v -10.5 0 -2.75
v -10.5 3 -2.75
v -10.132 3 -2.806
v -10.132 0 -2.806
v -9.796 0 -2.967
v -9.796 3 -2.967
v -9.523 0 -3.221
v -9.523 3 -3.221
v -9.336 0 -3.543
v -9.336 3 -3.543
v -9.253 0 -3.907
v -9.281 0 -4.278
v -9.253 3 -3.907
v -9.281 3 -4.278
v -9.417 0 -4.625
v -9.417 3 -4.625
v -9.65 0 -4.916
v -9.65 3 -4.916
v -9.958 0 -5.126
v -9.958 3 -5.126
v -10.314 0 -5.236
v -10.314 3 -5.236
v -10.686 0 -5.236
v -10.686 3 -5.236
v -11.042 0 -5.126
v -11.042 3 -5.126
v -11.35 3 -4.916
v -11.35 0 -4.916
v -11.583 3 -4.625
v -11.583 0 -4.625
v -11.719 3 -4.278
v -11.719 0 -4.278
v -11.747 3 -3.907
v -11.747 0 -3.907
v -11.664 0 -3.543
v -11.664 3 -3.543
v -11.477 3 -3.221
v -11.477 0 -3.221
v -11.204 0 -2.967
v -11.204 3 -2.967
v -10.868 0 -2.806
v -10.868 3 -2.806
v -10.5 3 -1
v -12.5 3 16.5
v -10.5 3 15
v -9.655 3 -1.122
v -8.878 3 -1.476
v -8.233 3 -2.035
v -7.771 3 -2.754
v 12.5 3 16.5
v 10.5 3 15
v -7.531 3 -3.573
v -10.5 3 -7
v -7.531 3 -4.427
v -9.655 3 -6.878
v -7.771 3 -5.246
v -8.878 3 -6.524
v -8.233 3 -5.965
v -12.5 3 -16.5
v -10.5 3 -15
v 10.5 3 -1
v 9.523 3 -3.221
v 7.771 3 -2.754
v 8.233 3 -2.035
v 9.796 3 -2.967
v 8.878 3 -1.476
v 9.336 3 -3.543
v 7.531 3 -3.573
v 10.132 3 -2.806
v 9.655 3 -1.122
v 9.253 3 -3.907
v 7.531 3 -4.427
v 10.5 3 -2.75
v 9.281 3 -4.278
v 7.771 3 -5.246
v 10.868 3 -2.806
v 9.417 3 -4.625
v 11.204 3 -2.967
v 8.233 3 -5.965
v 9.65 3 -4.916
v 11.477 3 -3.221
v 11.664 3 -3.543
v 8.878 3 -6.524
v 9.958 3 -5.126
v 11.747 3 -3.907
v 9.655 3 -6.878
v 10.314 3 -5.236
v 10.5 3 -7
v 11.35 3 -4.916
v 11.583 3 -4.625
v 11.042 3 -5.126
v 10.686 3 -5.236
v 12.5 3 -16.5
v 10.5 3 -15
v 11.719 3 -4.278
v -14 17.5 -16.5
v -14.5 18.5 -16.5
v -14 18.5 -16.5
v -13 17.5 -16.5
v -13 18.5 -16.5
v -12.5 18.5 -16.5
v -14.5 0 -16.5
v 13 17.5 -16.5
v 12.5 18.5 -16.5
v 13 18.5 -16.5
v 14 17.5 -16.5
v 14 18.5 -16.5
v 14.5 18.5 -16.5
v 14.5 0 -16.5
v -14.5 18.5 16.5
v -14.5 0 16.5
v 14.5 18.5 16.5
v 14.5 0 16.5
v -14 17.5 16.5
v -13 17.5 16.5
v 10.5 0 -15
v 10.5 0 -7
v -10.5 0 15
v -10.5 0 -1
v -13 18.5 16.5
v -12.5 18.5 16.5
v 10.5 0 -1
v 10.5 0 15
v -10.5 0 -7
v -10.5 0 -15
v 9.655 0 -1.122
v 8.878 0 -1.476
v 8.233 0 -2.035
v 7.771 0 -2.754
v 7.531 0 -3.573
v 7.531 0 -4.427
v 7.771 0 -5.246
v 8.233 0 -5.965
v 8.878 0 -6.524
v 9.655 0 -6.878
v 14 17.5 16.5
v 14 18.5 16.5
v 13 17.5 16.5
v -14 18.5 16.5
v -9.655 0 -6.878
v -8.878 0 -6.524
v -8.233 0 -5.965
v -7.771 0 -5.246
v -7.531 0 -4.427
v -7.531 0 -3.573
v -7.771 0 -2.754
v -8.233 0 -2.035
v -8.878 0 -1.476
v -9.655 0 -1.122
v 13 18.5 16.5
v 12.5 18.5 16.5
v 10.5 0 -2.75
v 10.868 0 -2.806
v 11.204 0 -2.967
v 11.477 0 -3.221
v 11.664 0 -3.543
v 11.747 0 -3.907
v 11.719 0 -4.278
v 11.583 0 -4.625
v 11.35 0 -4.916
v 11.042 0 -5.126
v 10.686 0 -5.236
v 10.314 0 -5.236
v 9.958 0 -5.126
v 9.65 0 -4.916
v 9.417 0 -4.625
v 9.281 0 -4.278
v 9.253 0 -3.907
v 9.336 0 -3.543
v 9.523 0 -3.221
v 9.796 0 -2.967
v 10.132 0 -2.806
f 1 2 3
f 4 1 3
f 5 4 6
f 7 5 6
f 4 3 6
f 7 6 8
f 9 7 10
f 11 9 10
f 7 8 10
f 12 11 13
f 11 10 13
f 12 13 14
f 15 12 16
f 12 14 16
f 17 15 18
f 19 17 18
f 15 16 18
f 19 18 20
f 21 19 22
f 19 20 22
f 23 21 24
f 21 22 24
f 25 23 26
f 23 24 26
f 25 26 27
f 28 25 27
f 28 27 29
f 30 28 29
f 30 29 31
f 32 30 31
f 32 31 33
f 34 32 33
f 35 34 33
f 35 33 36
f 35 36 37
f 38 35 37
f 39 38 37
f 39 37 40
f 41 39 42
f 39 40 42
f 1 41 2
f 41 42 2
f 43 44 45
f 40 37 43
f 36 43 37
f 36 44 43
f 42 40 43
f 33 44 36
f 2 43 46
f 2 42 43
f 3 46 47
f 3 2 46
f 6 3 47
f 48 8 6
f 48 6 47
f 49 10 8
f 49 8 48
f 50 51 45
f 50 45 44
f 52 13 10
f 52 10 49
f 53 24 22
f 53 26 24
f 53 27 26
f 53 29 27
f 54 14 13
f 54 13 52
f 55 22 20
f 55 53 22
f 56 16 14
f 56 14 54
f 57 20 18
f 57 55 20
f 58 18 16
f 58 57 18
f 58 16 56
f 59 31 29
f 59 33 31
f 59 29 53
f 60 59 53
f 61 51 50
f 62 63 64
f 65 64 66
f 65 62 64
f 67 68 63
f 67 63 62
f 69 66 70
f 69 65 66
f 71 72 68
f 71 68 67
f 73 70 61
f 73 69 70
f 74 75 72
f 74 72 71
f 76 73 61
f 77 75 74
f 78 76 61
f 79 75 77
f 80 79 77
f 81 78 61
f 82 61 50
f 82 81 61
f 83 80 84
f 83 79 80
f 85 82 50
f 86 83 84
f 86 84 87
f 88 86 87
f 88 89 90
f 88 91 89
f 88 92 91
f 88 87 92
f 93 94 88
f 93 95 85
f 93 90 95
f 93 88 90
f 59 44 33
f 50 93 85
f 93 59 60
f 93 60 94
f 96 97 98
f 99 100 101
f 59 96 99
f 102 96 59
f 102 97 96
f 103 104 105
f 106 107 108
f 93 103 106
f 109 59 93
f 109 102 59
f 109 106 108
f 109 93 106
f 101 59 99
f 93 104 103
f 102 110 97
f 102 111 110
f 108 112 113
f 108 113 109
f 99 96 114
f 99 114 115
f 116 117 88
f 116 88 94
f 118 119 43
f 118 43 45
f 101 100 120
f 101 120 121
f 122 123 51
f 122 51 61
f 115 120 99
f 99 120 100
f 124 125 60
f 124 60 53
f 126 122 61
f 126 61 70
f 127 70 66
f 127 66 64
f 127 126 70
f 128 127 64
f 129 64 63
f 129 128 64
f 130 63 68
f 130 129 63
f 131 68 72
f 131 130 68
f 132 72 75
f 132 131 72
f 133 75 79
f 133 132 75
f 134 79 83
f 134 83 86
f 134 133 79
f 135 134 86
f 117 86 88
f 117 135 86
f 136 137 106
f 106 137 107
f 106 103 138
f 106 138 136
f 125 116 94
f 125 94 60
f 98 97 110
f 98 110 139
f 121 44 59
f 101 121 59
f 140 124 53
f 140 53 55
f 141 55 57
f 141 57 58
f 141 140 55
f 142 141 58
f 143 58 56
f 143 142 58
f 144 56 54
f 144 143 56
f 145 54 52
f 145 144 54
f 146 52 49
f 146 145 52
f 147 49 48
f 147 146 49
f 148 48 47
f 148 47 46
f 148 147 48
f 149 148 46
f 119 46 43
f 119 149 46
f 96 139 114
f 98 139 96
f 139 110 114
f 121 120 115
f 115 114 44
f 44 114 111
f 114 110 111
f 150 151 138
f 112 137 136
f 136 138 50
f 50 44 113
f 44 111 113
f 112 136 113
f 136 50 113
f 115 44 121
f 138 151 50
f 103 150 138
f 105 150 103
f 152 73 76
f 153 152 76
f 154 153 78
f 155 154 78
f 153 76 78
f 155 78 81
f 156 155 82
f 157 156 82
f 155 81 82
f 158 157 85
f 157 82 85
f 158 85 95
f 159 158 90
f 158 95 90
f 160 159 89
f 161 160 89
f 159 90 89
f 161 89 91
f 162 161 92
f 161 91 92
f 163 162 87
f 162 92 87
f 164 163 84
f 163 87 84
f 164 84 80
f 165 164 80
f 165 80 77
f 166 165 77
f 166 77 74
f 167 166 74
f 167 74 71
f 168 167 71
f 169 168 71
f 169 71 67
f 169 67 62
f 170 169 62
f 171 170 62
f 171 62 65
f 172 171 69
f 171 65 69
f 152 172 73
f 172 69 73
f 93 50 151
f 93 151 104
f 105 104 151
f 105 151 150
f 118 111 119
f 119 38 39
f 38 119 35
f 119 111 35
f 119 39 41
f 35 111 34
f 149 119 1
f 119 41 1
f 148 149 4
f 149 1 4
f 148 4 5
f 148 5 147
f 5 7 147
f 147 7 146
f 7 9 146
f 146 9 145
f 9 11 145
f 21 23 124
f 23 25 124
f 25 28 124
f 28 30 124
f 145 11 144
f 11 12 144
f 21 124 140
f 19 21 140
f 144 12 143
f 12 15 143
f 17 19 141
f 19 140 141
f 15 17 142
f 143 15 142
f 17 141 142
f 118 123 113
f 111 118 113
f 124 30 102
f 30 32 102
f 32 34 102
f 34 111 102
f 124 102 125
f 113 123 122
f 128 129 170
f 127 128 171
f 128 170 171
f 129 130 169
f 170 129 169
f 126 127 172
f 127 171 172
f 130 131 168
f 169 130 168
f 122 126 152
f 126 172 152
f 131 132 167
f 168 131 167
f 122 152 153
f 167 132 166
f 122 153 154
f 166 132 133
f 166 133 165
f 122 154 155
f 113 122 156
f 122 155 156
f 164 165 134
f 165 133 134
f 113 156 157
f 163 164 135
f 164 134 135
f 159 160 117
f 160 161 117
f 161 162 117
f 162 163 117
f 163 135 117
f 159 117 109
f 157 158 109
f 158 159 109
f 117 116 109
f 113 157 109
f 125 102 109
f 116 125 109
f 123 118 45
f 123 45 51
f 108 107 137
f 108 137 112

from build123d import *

# Parameters (mm, degrees)
SKETCH1_W           = 24
SKETCH1_H           = 33
BOSS_EXTRUDE2_DEPTH = 3
SKETCH2_R           = 1.25
CUT_EXTRUDE2_DEPTH  = 3
SKETCH4_W           = 2.5
SKETCH4_H           = 33
BOSS_EXTRUDE3_DEPTH = 3
SKETCH5_W           = 2
SKETCH5_H           = 33
BOSS_EXTRUDE4_DEPTH = 15.5
SKETCH6_W           = 1
SKETCH6_H           = 33
CUT_EXTRUDE3_DEPTH  = 1


with BuildPart() as part:
    # Sketch1 → Boss-Extrude2 (new body)
    with BuildSketch(Plane(origin=(0, 0, 0), x_dir=(1, 0, 0), z_dir=(0, 1, 0))):
        Rectangle(SKETCH1_W, SKETCH1_H)
        with BuildLine():
            Line((10.5, 7), (10.5, 15))
            Line((10.5, 15), (-10.5, 15))
            Line((-10.5, 15), (-10.5, 7))
            ThreePointArc((-10.5, 7), (-7.5, 4), (-10.5, 1))
            Line((-10.5, 1), (-10.5, -15))
            Line((-10.5, -15), (10.5, -15))
            Line((10.5, -15), (10.5, 1))
            ThreePointArc((10.5, 1), (7.5, 4), (10.5, 7))
        make_face(mode=Mode.SUBTRACT)
    extrude(amount=BOSS_EXTRUDE2_DEPTH)

    # Sketch2 → Cut-Extrude2 (cut)
    with BuildSketch(Plane(origin=(0, 3, 0), x_dir=(1, 0, 0), z_dir=(0, 1, 0))):
        with Locations(Location((-10.5, 4, 0), (0, 0, 270))):
            Circle(SKETCH2_R)
        with Locations(Location((10.5, 4, 0), (0, 0, 270))):
            Circle(SKETCH2_R)
    extrude(amount=-CUT_EXTRUDE2_DEPTH, mode=Mode.SUBTRACT)

    # Sketch4 → Boss-Extrude3 (add)
    with BuildSketch(Plane(origin=(0, 3, 0), x_dir=(1, 0, 0), z_dir=(0, 1, 0))):
        with Locations((-13.25, 0)):
            Rectangle(SKETCH4_W, SKETCH4_H)
        with Locations((13.25, 0)):
            Rectangle(SKETCH4_W, SKETCH4_H)
    extrude(amount=-BOSS_EXTRUDE3_DEPTH)

    # Sketch5 → Boss-Extrude4 (add)
    with BuildSketch(Plane(origin=(0, 3, 0), x_dir=(1, 0, 0), z_dir=(0, 1, 0))):
        with Locations((-13.5, 0)):
            Rectangle(SKETCH5_W, SKETCH5_H)
        with Locations((13.5, 0)):
            Rectangle(SKETCH5_W, SKETCH5_H)
    extrude(amount=BOSS_EXTRUDE4_DEPTH)

    # Sketch6 → Cut-Extrude3 (cut)
    with BuildSketch(Plane(origin=(0, 18.5, 0), x_dir=(1, 0, 0), z_dir=(0, 1, 0))):
        with Locations((13.5, 0)):
            Rectangle(SKETCH6_W, SKETCH6_H)
        with Locations((-13.5, 0)):
            Rectangle(SKETCH6_W, SKETCH6_H)
    extrude(amount=-CUT_EXTRUDE3_DEPTH, mode=Mode.SUBTRACT)


solid = part.part
